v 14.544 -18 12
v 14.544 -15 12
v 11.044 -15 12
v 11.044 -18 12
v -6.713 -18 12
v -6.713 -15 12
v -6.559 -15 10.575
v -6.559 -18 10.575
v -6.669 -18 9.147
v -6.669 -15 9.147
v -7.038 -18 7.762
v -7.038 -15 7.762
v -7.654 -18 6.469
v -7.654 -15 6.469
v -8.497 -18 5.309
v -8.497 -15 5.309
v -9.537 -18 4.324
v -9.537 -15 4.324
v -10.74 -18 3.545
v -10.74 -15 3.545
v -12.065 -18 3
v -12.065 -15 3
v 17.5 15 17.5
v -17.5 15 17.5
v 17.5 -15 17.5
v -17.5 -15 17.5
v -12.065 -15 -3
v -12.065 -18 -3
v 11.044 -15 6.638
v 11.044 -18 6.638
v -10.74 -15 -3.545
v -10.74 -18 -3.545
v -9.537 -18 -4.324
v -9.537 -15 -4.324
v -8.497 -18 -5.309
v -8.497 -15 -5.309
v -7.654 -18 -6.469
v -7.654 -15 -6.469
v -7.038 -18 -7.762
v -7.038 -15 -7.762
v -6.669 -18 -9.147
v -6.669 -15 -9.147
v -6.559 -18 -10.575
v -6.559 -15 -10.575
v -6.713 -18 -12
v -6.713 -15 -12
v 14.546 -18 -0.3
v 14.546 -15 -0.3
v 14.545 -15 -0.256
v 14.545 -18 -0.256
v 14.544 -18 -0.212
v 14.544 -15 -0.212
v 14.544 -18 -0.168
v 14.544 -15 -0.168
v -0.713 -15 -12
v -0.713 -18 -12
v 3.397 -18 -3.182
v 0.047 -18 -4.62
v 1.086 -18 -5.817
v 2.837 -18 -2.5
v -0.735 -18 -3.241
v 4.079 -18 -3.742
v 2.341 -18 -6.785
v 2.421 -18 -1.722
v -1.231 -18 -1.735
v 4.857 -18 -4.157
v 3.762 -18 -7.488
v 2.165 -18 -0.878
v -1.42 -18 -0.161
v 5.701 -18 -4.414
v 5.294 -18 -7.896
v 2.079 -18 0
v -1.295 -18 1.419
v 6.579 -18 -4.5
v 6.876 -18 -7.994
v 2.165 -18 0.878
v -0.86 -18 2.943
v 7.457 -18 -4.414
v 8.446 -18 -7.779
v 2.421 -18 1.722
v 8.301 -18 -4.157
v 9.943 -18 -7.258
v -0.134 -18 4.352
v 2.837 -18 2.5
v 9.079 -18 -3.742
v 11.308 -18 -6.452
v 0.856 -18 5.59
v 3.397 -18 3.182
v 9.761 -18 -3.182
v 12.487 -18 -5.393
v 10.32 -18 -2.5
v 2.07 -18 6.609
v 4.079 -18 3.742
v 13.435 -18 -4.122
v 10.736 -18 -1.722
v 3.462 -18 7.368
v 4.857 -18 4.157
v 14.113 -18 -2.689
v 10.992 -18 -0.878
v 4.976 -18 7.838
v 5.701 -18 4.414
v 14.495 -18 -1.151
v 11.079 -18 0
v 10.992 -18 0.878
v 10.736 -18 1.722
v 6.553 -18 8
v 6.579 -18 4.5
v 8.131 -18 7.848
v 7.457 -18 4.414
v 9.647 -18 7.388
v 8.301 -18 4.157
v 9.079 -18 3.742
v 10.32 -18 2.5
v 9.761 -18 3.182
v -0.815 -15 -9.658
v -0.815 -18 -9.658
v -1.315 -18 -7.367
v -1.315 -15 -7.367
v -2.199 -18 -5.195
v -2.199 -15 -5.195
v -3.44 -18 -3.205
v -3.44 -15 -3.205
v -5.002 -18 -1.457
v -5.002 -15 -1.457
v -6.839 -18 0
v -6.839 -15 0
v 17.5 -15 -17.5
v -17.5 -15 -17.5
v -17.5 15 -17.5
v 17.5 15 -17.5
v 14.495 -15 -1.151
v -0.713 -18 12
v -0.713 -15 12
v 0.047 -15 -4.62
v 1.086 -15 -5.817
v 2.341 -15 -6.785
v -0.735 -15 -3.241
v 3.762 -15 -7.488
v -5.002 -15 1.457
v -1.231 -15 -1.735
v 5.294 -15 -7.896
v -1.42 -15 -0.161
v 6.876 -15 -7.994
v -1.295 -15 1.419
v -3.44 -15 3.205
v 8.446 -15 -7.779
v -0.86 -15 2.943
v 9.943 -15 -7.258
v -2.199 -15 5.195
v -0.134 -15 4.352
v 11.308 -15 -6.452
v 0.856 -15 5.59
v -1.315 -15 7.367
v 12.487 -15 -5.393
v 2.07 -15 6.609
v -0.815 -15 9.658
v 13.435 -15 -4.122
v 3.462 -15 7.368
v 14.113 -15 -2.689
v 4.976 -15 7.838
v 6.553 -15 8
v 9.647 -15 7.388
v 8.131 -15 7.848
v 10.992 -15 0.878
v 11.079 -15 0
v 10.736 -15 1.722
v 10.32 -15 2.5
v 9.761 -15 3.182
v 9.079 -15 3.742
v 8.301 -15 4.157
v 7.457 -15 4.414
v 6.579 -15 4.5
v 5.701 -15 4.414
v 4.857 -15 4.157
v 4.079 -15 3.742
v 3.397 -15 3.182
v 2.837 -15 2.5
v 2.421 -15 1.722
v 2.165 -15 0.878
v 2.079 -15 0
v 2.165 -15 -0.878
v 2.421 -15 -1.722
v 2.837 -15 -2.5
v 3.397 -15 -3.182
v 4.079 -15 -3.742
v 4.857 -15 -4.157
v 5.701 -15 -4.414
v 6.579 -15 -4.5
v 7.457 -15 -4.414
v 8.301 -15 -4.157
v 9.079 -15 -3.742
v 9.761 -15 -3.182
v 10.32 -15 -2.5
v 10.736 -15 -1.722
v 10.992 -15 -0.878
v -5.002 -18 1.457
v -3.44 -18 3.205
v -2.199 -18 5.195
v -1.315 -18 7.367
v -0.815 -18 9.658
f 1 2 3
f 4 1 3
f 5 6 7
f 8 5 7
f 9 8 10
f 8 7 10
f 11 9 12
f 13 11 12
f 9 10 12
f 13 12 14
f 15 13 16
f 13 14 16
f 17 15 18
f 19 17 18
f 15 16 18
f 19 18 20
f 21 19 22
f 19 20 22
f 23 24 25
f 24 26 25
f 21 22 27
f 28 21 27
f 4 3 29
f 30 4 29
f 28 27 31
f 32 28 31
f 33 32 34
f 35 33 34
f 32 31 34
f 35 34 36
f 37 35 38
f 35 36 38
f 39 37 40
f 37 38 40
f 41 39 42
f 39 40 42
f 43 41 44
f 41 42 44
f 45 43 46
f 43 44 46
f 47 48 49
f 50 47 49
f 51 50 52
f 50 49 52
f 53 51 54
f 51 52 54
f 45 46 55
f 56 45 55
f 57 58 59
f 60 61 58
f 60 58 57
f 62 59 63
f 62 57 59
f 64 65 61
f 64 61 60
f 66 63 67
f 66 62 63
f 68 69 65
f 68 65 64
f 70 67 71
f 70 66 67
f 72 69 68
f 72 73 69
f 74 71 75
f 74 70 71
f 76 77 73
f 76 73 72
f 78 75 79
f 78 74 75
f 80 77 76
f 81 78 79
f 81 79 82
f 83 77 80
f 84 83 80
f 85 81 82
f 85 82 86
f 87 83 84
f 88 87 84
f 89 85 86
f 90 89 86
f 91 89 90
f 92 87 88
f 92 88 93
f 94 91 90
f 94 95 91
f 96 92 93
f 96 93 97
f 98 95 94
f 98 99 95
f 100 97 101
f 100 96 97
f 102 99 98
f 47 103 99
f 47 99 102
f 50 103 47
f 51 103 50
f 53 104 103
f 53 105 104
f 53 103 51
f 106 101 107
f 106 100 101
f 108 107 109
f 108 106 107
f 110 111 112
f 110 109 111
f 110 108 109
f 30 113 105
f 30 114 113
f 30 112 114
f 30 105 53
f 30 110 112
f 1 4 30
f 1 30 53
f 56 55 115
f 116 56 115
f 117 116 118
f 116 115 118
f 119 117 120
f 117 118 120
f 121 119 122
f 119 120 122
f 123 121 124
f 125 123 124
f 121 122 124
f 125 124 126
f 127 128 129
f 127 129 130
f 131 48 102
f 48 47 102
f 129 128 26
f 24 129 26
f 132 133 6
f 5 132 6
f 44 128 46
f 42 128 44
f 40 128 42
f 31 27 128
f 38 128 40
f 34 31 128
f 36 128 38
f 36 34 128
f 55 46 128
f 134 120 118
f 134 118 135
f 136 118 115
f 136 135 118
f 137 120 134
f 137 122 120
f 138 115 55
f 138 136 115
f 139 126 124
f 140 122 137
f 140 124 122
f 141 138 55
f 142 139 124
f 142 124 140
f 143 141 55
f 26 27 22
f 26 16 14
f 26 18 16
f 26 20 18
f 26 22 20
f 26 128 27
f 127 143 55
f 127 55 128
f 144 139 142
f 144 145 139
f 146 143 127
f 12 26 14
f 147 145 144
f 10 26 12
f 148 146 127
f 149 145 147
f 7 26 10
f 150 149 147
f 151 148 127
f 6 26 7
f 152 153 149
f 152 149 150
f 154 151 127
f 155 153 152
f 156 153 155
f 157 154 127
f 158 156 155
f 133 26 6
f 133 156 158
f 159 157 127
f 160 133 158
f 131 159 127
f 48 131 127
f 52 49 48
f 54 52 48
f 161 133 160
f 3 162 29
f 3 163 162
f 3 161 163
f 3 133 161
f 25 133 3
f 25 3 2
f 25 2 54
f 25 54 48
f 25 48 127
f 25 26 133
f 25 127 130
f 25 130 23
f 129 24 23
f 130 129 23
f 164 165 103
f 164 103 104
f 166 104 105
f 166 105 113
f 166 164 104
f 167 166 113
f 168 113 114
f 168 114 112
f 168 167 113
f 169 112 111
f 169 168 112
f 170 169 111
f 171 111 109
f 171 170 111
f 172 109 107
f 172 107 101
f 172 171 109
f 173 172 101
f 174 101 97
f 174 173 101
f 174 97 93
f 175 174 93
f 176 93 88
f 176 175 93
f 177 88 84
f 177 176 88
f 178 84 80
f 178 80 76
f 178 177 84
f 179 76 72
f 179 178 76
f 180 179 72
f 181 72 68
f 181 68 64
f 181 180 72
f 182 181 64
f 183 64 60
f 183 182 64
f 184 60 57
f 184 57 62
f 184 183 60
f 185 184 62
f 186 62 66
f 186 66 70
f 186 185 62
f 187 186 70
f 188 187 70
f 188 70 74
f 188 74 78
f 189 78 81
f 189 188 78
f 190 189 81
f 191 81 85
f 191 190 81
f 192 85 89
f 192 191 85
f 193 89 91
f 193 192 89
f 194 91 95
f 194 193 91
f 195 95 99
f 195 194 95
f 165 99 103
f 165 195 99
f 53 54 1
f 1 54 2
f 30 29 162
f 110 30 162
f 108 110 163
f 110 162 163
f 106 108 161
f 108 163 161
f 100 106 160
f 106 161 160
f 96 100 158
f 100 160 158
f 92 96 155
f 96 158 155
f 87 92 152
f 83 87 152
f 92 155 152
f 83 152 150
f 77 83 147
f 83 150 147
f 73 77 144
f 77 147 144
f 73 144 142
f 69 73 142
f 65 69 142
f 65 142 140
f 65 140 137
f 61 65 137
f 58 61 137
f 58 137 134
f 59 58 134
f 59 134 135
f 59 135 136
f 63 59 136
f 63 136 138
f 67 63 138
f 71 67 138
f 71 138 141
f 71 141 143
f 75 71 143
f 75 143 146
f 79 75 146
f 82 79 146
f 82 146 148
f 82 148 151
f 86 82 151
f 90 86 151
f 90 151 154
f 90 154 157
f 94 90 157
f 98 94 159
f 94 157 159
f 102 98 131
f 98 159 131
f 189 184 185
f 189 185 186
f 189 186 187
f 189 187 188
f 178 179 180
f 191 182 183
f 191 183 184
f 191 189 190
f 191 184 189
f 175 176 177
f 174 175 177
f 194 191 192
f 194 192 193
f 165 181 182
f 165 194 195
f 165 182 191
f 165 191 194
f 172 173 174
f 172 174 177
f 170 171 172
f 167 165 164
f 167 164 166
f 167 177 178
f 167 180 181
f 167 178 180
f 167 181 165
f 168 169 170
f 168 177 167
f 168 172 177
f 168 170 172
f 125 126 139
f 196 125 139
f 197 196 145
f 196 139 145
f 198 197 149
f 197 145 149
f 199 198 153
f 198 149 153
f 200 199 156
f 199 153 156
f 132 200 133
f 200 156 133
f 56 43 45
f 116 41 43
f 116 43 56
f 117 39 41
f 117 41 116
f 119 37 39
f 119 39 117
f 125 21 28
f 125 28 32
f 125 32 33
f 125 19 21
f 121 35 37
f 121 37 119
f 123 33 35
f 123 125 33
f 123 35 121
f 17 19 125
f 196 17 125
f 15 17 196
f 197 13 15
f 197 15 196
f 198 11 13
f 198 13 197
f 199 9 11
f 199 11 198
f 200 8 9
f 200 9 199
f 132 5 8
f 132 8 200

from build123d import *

# Parameters (mm, degrees)
F0_W        = 35
F0_H        = 35
F1_DEPTH    = 15
F3_R        = 4.5
F4_DEPTH    = 3
F5_T1_DEPTH = 3.9749724421
F6_R        = 5


# Not quite as in the source:
# - a fillet or chamfer that OpenCascade refuses, or shapes differently, is made with other operations: its cross-section is extruded or revolved along the edge and cut away or added


with BuildPart() as f1:
    # F0 (on Front) → F1 (new body, symmetric)
    with BuildSketch(Plane.XZ):
        Rectangle(F0_W, F0_H)
    extrude(amount=F1_DEPTH, both=True)

    # F3 (on face) → F4 (join)
    with BuildSketch(Plane.XZ.offset(15)):
        with BuildLine():
            Line((-12.0646512398, 3), (-12.0646512398, 0))
            Line((-12.0646512398, 0), (-12.0646512398, -3))
            ThreePointArc((-12.0646512398, -3), (-7.6541876394, -6.4685364284), (-6.7129943114, -12))
            Line((-6.7129943114, -12), (-0.7129943114, -12))
            ThreePointArc((-0.7129943114, -12), (-2.1988842528, -5.1949035825), (-6.8389470689, 0))
            ThreePointArc((-6.8389470689, 0), (-2.1988842528, 5.1949035825), (-0.7129943114, 12))
            Line((-0.7129943114, 12), (-6.7129943114, 12))
            ThreePointArc((-6.7129943114, 12), (-7.6541876394, 6.4685364284), (-12.0646512398, 3))
        make_face()
        with BuildLine():
            Line((11.0439136906, 12), (11.0439136906, 6.6378525317))
            ThreePointArc((11.0439136906, 6.6378525317), (-0.6094940203, -3.5115698933), (14.5591460332, -0.5577510491))
            Line((14.5591460332, -0.5577510491), (14.5439136906, -0.5577510491))
            Line((14.5439136906, -0.5577510491), (14.5439136906, 12))
            Line((14.5439136906, 12), (11.0439136906, 12))
        make_face()
        with Locations((6.578612607, 0)):
            Circle(F3_R, mode=Mode.SUBTRACT)
    extrude(amount=F4_DEPTH)

    # F5: fillet of radius 5 on 1 edges, made by hand

    # F5_s2 → F5_t1 (join)
    with BuildSketch(Plane.XZ.offset(14.0250275579)):
        with BuildLine():
            ThreePointArc((14.5591460332, -0.5577510491), (14.5477232275, -0.3629052417), (14.5439136906, -0.1677620723))
            Line((14.5439136906, -0.1677620723), (14.5439136906, -0.5577510491))
            Line((14.5439136906, -0.5577510491), (14.5591460332, -0.5577510491))
        make_face()
    extrude(amount=F5_T1_DEPTH)

    # F6
    f6_edges = [f1.edges().sort_by_distance(p)[0] for p in [
        (14.559146, -16.5, -0.557751),
    ]]
    fillet(f6_edges, radius=F6_R)


solid = f1.part
